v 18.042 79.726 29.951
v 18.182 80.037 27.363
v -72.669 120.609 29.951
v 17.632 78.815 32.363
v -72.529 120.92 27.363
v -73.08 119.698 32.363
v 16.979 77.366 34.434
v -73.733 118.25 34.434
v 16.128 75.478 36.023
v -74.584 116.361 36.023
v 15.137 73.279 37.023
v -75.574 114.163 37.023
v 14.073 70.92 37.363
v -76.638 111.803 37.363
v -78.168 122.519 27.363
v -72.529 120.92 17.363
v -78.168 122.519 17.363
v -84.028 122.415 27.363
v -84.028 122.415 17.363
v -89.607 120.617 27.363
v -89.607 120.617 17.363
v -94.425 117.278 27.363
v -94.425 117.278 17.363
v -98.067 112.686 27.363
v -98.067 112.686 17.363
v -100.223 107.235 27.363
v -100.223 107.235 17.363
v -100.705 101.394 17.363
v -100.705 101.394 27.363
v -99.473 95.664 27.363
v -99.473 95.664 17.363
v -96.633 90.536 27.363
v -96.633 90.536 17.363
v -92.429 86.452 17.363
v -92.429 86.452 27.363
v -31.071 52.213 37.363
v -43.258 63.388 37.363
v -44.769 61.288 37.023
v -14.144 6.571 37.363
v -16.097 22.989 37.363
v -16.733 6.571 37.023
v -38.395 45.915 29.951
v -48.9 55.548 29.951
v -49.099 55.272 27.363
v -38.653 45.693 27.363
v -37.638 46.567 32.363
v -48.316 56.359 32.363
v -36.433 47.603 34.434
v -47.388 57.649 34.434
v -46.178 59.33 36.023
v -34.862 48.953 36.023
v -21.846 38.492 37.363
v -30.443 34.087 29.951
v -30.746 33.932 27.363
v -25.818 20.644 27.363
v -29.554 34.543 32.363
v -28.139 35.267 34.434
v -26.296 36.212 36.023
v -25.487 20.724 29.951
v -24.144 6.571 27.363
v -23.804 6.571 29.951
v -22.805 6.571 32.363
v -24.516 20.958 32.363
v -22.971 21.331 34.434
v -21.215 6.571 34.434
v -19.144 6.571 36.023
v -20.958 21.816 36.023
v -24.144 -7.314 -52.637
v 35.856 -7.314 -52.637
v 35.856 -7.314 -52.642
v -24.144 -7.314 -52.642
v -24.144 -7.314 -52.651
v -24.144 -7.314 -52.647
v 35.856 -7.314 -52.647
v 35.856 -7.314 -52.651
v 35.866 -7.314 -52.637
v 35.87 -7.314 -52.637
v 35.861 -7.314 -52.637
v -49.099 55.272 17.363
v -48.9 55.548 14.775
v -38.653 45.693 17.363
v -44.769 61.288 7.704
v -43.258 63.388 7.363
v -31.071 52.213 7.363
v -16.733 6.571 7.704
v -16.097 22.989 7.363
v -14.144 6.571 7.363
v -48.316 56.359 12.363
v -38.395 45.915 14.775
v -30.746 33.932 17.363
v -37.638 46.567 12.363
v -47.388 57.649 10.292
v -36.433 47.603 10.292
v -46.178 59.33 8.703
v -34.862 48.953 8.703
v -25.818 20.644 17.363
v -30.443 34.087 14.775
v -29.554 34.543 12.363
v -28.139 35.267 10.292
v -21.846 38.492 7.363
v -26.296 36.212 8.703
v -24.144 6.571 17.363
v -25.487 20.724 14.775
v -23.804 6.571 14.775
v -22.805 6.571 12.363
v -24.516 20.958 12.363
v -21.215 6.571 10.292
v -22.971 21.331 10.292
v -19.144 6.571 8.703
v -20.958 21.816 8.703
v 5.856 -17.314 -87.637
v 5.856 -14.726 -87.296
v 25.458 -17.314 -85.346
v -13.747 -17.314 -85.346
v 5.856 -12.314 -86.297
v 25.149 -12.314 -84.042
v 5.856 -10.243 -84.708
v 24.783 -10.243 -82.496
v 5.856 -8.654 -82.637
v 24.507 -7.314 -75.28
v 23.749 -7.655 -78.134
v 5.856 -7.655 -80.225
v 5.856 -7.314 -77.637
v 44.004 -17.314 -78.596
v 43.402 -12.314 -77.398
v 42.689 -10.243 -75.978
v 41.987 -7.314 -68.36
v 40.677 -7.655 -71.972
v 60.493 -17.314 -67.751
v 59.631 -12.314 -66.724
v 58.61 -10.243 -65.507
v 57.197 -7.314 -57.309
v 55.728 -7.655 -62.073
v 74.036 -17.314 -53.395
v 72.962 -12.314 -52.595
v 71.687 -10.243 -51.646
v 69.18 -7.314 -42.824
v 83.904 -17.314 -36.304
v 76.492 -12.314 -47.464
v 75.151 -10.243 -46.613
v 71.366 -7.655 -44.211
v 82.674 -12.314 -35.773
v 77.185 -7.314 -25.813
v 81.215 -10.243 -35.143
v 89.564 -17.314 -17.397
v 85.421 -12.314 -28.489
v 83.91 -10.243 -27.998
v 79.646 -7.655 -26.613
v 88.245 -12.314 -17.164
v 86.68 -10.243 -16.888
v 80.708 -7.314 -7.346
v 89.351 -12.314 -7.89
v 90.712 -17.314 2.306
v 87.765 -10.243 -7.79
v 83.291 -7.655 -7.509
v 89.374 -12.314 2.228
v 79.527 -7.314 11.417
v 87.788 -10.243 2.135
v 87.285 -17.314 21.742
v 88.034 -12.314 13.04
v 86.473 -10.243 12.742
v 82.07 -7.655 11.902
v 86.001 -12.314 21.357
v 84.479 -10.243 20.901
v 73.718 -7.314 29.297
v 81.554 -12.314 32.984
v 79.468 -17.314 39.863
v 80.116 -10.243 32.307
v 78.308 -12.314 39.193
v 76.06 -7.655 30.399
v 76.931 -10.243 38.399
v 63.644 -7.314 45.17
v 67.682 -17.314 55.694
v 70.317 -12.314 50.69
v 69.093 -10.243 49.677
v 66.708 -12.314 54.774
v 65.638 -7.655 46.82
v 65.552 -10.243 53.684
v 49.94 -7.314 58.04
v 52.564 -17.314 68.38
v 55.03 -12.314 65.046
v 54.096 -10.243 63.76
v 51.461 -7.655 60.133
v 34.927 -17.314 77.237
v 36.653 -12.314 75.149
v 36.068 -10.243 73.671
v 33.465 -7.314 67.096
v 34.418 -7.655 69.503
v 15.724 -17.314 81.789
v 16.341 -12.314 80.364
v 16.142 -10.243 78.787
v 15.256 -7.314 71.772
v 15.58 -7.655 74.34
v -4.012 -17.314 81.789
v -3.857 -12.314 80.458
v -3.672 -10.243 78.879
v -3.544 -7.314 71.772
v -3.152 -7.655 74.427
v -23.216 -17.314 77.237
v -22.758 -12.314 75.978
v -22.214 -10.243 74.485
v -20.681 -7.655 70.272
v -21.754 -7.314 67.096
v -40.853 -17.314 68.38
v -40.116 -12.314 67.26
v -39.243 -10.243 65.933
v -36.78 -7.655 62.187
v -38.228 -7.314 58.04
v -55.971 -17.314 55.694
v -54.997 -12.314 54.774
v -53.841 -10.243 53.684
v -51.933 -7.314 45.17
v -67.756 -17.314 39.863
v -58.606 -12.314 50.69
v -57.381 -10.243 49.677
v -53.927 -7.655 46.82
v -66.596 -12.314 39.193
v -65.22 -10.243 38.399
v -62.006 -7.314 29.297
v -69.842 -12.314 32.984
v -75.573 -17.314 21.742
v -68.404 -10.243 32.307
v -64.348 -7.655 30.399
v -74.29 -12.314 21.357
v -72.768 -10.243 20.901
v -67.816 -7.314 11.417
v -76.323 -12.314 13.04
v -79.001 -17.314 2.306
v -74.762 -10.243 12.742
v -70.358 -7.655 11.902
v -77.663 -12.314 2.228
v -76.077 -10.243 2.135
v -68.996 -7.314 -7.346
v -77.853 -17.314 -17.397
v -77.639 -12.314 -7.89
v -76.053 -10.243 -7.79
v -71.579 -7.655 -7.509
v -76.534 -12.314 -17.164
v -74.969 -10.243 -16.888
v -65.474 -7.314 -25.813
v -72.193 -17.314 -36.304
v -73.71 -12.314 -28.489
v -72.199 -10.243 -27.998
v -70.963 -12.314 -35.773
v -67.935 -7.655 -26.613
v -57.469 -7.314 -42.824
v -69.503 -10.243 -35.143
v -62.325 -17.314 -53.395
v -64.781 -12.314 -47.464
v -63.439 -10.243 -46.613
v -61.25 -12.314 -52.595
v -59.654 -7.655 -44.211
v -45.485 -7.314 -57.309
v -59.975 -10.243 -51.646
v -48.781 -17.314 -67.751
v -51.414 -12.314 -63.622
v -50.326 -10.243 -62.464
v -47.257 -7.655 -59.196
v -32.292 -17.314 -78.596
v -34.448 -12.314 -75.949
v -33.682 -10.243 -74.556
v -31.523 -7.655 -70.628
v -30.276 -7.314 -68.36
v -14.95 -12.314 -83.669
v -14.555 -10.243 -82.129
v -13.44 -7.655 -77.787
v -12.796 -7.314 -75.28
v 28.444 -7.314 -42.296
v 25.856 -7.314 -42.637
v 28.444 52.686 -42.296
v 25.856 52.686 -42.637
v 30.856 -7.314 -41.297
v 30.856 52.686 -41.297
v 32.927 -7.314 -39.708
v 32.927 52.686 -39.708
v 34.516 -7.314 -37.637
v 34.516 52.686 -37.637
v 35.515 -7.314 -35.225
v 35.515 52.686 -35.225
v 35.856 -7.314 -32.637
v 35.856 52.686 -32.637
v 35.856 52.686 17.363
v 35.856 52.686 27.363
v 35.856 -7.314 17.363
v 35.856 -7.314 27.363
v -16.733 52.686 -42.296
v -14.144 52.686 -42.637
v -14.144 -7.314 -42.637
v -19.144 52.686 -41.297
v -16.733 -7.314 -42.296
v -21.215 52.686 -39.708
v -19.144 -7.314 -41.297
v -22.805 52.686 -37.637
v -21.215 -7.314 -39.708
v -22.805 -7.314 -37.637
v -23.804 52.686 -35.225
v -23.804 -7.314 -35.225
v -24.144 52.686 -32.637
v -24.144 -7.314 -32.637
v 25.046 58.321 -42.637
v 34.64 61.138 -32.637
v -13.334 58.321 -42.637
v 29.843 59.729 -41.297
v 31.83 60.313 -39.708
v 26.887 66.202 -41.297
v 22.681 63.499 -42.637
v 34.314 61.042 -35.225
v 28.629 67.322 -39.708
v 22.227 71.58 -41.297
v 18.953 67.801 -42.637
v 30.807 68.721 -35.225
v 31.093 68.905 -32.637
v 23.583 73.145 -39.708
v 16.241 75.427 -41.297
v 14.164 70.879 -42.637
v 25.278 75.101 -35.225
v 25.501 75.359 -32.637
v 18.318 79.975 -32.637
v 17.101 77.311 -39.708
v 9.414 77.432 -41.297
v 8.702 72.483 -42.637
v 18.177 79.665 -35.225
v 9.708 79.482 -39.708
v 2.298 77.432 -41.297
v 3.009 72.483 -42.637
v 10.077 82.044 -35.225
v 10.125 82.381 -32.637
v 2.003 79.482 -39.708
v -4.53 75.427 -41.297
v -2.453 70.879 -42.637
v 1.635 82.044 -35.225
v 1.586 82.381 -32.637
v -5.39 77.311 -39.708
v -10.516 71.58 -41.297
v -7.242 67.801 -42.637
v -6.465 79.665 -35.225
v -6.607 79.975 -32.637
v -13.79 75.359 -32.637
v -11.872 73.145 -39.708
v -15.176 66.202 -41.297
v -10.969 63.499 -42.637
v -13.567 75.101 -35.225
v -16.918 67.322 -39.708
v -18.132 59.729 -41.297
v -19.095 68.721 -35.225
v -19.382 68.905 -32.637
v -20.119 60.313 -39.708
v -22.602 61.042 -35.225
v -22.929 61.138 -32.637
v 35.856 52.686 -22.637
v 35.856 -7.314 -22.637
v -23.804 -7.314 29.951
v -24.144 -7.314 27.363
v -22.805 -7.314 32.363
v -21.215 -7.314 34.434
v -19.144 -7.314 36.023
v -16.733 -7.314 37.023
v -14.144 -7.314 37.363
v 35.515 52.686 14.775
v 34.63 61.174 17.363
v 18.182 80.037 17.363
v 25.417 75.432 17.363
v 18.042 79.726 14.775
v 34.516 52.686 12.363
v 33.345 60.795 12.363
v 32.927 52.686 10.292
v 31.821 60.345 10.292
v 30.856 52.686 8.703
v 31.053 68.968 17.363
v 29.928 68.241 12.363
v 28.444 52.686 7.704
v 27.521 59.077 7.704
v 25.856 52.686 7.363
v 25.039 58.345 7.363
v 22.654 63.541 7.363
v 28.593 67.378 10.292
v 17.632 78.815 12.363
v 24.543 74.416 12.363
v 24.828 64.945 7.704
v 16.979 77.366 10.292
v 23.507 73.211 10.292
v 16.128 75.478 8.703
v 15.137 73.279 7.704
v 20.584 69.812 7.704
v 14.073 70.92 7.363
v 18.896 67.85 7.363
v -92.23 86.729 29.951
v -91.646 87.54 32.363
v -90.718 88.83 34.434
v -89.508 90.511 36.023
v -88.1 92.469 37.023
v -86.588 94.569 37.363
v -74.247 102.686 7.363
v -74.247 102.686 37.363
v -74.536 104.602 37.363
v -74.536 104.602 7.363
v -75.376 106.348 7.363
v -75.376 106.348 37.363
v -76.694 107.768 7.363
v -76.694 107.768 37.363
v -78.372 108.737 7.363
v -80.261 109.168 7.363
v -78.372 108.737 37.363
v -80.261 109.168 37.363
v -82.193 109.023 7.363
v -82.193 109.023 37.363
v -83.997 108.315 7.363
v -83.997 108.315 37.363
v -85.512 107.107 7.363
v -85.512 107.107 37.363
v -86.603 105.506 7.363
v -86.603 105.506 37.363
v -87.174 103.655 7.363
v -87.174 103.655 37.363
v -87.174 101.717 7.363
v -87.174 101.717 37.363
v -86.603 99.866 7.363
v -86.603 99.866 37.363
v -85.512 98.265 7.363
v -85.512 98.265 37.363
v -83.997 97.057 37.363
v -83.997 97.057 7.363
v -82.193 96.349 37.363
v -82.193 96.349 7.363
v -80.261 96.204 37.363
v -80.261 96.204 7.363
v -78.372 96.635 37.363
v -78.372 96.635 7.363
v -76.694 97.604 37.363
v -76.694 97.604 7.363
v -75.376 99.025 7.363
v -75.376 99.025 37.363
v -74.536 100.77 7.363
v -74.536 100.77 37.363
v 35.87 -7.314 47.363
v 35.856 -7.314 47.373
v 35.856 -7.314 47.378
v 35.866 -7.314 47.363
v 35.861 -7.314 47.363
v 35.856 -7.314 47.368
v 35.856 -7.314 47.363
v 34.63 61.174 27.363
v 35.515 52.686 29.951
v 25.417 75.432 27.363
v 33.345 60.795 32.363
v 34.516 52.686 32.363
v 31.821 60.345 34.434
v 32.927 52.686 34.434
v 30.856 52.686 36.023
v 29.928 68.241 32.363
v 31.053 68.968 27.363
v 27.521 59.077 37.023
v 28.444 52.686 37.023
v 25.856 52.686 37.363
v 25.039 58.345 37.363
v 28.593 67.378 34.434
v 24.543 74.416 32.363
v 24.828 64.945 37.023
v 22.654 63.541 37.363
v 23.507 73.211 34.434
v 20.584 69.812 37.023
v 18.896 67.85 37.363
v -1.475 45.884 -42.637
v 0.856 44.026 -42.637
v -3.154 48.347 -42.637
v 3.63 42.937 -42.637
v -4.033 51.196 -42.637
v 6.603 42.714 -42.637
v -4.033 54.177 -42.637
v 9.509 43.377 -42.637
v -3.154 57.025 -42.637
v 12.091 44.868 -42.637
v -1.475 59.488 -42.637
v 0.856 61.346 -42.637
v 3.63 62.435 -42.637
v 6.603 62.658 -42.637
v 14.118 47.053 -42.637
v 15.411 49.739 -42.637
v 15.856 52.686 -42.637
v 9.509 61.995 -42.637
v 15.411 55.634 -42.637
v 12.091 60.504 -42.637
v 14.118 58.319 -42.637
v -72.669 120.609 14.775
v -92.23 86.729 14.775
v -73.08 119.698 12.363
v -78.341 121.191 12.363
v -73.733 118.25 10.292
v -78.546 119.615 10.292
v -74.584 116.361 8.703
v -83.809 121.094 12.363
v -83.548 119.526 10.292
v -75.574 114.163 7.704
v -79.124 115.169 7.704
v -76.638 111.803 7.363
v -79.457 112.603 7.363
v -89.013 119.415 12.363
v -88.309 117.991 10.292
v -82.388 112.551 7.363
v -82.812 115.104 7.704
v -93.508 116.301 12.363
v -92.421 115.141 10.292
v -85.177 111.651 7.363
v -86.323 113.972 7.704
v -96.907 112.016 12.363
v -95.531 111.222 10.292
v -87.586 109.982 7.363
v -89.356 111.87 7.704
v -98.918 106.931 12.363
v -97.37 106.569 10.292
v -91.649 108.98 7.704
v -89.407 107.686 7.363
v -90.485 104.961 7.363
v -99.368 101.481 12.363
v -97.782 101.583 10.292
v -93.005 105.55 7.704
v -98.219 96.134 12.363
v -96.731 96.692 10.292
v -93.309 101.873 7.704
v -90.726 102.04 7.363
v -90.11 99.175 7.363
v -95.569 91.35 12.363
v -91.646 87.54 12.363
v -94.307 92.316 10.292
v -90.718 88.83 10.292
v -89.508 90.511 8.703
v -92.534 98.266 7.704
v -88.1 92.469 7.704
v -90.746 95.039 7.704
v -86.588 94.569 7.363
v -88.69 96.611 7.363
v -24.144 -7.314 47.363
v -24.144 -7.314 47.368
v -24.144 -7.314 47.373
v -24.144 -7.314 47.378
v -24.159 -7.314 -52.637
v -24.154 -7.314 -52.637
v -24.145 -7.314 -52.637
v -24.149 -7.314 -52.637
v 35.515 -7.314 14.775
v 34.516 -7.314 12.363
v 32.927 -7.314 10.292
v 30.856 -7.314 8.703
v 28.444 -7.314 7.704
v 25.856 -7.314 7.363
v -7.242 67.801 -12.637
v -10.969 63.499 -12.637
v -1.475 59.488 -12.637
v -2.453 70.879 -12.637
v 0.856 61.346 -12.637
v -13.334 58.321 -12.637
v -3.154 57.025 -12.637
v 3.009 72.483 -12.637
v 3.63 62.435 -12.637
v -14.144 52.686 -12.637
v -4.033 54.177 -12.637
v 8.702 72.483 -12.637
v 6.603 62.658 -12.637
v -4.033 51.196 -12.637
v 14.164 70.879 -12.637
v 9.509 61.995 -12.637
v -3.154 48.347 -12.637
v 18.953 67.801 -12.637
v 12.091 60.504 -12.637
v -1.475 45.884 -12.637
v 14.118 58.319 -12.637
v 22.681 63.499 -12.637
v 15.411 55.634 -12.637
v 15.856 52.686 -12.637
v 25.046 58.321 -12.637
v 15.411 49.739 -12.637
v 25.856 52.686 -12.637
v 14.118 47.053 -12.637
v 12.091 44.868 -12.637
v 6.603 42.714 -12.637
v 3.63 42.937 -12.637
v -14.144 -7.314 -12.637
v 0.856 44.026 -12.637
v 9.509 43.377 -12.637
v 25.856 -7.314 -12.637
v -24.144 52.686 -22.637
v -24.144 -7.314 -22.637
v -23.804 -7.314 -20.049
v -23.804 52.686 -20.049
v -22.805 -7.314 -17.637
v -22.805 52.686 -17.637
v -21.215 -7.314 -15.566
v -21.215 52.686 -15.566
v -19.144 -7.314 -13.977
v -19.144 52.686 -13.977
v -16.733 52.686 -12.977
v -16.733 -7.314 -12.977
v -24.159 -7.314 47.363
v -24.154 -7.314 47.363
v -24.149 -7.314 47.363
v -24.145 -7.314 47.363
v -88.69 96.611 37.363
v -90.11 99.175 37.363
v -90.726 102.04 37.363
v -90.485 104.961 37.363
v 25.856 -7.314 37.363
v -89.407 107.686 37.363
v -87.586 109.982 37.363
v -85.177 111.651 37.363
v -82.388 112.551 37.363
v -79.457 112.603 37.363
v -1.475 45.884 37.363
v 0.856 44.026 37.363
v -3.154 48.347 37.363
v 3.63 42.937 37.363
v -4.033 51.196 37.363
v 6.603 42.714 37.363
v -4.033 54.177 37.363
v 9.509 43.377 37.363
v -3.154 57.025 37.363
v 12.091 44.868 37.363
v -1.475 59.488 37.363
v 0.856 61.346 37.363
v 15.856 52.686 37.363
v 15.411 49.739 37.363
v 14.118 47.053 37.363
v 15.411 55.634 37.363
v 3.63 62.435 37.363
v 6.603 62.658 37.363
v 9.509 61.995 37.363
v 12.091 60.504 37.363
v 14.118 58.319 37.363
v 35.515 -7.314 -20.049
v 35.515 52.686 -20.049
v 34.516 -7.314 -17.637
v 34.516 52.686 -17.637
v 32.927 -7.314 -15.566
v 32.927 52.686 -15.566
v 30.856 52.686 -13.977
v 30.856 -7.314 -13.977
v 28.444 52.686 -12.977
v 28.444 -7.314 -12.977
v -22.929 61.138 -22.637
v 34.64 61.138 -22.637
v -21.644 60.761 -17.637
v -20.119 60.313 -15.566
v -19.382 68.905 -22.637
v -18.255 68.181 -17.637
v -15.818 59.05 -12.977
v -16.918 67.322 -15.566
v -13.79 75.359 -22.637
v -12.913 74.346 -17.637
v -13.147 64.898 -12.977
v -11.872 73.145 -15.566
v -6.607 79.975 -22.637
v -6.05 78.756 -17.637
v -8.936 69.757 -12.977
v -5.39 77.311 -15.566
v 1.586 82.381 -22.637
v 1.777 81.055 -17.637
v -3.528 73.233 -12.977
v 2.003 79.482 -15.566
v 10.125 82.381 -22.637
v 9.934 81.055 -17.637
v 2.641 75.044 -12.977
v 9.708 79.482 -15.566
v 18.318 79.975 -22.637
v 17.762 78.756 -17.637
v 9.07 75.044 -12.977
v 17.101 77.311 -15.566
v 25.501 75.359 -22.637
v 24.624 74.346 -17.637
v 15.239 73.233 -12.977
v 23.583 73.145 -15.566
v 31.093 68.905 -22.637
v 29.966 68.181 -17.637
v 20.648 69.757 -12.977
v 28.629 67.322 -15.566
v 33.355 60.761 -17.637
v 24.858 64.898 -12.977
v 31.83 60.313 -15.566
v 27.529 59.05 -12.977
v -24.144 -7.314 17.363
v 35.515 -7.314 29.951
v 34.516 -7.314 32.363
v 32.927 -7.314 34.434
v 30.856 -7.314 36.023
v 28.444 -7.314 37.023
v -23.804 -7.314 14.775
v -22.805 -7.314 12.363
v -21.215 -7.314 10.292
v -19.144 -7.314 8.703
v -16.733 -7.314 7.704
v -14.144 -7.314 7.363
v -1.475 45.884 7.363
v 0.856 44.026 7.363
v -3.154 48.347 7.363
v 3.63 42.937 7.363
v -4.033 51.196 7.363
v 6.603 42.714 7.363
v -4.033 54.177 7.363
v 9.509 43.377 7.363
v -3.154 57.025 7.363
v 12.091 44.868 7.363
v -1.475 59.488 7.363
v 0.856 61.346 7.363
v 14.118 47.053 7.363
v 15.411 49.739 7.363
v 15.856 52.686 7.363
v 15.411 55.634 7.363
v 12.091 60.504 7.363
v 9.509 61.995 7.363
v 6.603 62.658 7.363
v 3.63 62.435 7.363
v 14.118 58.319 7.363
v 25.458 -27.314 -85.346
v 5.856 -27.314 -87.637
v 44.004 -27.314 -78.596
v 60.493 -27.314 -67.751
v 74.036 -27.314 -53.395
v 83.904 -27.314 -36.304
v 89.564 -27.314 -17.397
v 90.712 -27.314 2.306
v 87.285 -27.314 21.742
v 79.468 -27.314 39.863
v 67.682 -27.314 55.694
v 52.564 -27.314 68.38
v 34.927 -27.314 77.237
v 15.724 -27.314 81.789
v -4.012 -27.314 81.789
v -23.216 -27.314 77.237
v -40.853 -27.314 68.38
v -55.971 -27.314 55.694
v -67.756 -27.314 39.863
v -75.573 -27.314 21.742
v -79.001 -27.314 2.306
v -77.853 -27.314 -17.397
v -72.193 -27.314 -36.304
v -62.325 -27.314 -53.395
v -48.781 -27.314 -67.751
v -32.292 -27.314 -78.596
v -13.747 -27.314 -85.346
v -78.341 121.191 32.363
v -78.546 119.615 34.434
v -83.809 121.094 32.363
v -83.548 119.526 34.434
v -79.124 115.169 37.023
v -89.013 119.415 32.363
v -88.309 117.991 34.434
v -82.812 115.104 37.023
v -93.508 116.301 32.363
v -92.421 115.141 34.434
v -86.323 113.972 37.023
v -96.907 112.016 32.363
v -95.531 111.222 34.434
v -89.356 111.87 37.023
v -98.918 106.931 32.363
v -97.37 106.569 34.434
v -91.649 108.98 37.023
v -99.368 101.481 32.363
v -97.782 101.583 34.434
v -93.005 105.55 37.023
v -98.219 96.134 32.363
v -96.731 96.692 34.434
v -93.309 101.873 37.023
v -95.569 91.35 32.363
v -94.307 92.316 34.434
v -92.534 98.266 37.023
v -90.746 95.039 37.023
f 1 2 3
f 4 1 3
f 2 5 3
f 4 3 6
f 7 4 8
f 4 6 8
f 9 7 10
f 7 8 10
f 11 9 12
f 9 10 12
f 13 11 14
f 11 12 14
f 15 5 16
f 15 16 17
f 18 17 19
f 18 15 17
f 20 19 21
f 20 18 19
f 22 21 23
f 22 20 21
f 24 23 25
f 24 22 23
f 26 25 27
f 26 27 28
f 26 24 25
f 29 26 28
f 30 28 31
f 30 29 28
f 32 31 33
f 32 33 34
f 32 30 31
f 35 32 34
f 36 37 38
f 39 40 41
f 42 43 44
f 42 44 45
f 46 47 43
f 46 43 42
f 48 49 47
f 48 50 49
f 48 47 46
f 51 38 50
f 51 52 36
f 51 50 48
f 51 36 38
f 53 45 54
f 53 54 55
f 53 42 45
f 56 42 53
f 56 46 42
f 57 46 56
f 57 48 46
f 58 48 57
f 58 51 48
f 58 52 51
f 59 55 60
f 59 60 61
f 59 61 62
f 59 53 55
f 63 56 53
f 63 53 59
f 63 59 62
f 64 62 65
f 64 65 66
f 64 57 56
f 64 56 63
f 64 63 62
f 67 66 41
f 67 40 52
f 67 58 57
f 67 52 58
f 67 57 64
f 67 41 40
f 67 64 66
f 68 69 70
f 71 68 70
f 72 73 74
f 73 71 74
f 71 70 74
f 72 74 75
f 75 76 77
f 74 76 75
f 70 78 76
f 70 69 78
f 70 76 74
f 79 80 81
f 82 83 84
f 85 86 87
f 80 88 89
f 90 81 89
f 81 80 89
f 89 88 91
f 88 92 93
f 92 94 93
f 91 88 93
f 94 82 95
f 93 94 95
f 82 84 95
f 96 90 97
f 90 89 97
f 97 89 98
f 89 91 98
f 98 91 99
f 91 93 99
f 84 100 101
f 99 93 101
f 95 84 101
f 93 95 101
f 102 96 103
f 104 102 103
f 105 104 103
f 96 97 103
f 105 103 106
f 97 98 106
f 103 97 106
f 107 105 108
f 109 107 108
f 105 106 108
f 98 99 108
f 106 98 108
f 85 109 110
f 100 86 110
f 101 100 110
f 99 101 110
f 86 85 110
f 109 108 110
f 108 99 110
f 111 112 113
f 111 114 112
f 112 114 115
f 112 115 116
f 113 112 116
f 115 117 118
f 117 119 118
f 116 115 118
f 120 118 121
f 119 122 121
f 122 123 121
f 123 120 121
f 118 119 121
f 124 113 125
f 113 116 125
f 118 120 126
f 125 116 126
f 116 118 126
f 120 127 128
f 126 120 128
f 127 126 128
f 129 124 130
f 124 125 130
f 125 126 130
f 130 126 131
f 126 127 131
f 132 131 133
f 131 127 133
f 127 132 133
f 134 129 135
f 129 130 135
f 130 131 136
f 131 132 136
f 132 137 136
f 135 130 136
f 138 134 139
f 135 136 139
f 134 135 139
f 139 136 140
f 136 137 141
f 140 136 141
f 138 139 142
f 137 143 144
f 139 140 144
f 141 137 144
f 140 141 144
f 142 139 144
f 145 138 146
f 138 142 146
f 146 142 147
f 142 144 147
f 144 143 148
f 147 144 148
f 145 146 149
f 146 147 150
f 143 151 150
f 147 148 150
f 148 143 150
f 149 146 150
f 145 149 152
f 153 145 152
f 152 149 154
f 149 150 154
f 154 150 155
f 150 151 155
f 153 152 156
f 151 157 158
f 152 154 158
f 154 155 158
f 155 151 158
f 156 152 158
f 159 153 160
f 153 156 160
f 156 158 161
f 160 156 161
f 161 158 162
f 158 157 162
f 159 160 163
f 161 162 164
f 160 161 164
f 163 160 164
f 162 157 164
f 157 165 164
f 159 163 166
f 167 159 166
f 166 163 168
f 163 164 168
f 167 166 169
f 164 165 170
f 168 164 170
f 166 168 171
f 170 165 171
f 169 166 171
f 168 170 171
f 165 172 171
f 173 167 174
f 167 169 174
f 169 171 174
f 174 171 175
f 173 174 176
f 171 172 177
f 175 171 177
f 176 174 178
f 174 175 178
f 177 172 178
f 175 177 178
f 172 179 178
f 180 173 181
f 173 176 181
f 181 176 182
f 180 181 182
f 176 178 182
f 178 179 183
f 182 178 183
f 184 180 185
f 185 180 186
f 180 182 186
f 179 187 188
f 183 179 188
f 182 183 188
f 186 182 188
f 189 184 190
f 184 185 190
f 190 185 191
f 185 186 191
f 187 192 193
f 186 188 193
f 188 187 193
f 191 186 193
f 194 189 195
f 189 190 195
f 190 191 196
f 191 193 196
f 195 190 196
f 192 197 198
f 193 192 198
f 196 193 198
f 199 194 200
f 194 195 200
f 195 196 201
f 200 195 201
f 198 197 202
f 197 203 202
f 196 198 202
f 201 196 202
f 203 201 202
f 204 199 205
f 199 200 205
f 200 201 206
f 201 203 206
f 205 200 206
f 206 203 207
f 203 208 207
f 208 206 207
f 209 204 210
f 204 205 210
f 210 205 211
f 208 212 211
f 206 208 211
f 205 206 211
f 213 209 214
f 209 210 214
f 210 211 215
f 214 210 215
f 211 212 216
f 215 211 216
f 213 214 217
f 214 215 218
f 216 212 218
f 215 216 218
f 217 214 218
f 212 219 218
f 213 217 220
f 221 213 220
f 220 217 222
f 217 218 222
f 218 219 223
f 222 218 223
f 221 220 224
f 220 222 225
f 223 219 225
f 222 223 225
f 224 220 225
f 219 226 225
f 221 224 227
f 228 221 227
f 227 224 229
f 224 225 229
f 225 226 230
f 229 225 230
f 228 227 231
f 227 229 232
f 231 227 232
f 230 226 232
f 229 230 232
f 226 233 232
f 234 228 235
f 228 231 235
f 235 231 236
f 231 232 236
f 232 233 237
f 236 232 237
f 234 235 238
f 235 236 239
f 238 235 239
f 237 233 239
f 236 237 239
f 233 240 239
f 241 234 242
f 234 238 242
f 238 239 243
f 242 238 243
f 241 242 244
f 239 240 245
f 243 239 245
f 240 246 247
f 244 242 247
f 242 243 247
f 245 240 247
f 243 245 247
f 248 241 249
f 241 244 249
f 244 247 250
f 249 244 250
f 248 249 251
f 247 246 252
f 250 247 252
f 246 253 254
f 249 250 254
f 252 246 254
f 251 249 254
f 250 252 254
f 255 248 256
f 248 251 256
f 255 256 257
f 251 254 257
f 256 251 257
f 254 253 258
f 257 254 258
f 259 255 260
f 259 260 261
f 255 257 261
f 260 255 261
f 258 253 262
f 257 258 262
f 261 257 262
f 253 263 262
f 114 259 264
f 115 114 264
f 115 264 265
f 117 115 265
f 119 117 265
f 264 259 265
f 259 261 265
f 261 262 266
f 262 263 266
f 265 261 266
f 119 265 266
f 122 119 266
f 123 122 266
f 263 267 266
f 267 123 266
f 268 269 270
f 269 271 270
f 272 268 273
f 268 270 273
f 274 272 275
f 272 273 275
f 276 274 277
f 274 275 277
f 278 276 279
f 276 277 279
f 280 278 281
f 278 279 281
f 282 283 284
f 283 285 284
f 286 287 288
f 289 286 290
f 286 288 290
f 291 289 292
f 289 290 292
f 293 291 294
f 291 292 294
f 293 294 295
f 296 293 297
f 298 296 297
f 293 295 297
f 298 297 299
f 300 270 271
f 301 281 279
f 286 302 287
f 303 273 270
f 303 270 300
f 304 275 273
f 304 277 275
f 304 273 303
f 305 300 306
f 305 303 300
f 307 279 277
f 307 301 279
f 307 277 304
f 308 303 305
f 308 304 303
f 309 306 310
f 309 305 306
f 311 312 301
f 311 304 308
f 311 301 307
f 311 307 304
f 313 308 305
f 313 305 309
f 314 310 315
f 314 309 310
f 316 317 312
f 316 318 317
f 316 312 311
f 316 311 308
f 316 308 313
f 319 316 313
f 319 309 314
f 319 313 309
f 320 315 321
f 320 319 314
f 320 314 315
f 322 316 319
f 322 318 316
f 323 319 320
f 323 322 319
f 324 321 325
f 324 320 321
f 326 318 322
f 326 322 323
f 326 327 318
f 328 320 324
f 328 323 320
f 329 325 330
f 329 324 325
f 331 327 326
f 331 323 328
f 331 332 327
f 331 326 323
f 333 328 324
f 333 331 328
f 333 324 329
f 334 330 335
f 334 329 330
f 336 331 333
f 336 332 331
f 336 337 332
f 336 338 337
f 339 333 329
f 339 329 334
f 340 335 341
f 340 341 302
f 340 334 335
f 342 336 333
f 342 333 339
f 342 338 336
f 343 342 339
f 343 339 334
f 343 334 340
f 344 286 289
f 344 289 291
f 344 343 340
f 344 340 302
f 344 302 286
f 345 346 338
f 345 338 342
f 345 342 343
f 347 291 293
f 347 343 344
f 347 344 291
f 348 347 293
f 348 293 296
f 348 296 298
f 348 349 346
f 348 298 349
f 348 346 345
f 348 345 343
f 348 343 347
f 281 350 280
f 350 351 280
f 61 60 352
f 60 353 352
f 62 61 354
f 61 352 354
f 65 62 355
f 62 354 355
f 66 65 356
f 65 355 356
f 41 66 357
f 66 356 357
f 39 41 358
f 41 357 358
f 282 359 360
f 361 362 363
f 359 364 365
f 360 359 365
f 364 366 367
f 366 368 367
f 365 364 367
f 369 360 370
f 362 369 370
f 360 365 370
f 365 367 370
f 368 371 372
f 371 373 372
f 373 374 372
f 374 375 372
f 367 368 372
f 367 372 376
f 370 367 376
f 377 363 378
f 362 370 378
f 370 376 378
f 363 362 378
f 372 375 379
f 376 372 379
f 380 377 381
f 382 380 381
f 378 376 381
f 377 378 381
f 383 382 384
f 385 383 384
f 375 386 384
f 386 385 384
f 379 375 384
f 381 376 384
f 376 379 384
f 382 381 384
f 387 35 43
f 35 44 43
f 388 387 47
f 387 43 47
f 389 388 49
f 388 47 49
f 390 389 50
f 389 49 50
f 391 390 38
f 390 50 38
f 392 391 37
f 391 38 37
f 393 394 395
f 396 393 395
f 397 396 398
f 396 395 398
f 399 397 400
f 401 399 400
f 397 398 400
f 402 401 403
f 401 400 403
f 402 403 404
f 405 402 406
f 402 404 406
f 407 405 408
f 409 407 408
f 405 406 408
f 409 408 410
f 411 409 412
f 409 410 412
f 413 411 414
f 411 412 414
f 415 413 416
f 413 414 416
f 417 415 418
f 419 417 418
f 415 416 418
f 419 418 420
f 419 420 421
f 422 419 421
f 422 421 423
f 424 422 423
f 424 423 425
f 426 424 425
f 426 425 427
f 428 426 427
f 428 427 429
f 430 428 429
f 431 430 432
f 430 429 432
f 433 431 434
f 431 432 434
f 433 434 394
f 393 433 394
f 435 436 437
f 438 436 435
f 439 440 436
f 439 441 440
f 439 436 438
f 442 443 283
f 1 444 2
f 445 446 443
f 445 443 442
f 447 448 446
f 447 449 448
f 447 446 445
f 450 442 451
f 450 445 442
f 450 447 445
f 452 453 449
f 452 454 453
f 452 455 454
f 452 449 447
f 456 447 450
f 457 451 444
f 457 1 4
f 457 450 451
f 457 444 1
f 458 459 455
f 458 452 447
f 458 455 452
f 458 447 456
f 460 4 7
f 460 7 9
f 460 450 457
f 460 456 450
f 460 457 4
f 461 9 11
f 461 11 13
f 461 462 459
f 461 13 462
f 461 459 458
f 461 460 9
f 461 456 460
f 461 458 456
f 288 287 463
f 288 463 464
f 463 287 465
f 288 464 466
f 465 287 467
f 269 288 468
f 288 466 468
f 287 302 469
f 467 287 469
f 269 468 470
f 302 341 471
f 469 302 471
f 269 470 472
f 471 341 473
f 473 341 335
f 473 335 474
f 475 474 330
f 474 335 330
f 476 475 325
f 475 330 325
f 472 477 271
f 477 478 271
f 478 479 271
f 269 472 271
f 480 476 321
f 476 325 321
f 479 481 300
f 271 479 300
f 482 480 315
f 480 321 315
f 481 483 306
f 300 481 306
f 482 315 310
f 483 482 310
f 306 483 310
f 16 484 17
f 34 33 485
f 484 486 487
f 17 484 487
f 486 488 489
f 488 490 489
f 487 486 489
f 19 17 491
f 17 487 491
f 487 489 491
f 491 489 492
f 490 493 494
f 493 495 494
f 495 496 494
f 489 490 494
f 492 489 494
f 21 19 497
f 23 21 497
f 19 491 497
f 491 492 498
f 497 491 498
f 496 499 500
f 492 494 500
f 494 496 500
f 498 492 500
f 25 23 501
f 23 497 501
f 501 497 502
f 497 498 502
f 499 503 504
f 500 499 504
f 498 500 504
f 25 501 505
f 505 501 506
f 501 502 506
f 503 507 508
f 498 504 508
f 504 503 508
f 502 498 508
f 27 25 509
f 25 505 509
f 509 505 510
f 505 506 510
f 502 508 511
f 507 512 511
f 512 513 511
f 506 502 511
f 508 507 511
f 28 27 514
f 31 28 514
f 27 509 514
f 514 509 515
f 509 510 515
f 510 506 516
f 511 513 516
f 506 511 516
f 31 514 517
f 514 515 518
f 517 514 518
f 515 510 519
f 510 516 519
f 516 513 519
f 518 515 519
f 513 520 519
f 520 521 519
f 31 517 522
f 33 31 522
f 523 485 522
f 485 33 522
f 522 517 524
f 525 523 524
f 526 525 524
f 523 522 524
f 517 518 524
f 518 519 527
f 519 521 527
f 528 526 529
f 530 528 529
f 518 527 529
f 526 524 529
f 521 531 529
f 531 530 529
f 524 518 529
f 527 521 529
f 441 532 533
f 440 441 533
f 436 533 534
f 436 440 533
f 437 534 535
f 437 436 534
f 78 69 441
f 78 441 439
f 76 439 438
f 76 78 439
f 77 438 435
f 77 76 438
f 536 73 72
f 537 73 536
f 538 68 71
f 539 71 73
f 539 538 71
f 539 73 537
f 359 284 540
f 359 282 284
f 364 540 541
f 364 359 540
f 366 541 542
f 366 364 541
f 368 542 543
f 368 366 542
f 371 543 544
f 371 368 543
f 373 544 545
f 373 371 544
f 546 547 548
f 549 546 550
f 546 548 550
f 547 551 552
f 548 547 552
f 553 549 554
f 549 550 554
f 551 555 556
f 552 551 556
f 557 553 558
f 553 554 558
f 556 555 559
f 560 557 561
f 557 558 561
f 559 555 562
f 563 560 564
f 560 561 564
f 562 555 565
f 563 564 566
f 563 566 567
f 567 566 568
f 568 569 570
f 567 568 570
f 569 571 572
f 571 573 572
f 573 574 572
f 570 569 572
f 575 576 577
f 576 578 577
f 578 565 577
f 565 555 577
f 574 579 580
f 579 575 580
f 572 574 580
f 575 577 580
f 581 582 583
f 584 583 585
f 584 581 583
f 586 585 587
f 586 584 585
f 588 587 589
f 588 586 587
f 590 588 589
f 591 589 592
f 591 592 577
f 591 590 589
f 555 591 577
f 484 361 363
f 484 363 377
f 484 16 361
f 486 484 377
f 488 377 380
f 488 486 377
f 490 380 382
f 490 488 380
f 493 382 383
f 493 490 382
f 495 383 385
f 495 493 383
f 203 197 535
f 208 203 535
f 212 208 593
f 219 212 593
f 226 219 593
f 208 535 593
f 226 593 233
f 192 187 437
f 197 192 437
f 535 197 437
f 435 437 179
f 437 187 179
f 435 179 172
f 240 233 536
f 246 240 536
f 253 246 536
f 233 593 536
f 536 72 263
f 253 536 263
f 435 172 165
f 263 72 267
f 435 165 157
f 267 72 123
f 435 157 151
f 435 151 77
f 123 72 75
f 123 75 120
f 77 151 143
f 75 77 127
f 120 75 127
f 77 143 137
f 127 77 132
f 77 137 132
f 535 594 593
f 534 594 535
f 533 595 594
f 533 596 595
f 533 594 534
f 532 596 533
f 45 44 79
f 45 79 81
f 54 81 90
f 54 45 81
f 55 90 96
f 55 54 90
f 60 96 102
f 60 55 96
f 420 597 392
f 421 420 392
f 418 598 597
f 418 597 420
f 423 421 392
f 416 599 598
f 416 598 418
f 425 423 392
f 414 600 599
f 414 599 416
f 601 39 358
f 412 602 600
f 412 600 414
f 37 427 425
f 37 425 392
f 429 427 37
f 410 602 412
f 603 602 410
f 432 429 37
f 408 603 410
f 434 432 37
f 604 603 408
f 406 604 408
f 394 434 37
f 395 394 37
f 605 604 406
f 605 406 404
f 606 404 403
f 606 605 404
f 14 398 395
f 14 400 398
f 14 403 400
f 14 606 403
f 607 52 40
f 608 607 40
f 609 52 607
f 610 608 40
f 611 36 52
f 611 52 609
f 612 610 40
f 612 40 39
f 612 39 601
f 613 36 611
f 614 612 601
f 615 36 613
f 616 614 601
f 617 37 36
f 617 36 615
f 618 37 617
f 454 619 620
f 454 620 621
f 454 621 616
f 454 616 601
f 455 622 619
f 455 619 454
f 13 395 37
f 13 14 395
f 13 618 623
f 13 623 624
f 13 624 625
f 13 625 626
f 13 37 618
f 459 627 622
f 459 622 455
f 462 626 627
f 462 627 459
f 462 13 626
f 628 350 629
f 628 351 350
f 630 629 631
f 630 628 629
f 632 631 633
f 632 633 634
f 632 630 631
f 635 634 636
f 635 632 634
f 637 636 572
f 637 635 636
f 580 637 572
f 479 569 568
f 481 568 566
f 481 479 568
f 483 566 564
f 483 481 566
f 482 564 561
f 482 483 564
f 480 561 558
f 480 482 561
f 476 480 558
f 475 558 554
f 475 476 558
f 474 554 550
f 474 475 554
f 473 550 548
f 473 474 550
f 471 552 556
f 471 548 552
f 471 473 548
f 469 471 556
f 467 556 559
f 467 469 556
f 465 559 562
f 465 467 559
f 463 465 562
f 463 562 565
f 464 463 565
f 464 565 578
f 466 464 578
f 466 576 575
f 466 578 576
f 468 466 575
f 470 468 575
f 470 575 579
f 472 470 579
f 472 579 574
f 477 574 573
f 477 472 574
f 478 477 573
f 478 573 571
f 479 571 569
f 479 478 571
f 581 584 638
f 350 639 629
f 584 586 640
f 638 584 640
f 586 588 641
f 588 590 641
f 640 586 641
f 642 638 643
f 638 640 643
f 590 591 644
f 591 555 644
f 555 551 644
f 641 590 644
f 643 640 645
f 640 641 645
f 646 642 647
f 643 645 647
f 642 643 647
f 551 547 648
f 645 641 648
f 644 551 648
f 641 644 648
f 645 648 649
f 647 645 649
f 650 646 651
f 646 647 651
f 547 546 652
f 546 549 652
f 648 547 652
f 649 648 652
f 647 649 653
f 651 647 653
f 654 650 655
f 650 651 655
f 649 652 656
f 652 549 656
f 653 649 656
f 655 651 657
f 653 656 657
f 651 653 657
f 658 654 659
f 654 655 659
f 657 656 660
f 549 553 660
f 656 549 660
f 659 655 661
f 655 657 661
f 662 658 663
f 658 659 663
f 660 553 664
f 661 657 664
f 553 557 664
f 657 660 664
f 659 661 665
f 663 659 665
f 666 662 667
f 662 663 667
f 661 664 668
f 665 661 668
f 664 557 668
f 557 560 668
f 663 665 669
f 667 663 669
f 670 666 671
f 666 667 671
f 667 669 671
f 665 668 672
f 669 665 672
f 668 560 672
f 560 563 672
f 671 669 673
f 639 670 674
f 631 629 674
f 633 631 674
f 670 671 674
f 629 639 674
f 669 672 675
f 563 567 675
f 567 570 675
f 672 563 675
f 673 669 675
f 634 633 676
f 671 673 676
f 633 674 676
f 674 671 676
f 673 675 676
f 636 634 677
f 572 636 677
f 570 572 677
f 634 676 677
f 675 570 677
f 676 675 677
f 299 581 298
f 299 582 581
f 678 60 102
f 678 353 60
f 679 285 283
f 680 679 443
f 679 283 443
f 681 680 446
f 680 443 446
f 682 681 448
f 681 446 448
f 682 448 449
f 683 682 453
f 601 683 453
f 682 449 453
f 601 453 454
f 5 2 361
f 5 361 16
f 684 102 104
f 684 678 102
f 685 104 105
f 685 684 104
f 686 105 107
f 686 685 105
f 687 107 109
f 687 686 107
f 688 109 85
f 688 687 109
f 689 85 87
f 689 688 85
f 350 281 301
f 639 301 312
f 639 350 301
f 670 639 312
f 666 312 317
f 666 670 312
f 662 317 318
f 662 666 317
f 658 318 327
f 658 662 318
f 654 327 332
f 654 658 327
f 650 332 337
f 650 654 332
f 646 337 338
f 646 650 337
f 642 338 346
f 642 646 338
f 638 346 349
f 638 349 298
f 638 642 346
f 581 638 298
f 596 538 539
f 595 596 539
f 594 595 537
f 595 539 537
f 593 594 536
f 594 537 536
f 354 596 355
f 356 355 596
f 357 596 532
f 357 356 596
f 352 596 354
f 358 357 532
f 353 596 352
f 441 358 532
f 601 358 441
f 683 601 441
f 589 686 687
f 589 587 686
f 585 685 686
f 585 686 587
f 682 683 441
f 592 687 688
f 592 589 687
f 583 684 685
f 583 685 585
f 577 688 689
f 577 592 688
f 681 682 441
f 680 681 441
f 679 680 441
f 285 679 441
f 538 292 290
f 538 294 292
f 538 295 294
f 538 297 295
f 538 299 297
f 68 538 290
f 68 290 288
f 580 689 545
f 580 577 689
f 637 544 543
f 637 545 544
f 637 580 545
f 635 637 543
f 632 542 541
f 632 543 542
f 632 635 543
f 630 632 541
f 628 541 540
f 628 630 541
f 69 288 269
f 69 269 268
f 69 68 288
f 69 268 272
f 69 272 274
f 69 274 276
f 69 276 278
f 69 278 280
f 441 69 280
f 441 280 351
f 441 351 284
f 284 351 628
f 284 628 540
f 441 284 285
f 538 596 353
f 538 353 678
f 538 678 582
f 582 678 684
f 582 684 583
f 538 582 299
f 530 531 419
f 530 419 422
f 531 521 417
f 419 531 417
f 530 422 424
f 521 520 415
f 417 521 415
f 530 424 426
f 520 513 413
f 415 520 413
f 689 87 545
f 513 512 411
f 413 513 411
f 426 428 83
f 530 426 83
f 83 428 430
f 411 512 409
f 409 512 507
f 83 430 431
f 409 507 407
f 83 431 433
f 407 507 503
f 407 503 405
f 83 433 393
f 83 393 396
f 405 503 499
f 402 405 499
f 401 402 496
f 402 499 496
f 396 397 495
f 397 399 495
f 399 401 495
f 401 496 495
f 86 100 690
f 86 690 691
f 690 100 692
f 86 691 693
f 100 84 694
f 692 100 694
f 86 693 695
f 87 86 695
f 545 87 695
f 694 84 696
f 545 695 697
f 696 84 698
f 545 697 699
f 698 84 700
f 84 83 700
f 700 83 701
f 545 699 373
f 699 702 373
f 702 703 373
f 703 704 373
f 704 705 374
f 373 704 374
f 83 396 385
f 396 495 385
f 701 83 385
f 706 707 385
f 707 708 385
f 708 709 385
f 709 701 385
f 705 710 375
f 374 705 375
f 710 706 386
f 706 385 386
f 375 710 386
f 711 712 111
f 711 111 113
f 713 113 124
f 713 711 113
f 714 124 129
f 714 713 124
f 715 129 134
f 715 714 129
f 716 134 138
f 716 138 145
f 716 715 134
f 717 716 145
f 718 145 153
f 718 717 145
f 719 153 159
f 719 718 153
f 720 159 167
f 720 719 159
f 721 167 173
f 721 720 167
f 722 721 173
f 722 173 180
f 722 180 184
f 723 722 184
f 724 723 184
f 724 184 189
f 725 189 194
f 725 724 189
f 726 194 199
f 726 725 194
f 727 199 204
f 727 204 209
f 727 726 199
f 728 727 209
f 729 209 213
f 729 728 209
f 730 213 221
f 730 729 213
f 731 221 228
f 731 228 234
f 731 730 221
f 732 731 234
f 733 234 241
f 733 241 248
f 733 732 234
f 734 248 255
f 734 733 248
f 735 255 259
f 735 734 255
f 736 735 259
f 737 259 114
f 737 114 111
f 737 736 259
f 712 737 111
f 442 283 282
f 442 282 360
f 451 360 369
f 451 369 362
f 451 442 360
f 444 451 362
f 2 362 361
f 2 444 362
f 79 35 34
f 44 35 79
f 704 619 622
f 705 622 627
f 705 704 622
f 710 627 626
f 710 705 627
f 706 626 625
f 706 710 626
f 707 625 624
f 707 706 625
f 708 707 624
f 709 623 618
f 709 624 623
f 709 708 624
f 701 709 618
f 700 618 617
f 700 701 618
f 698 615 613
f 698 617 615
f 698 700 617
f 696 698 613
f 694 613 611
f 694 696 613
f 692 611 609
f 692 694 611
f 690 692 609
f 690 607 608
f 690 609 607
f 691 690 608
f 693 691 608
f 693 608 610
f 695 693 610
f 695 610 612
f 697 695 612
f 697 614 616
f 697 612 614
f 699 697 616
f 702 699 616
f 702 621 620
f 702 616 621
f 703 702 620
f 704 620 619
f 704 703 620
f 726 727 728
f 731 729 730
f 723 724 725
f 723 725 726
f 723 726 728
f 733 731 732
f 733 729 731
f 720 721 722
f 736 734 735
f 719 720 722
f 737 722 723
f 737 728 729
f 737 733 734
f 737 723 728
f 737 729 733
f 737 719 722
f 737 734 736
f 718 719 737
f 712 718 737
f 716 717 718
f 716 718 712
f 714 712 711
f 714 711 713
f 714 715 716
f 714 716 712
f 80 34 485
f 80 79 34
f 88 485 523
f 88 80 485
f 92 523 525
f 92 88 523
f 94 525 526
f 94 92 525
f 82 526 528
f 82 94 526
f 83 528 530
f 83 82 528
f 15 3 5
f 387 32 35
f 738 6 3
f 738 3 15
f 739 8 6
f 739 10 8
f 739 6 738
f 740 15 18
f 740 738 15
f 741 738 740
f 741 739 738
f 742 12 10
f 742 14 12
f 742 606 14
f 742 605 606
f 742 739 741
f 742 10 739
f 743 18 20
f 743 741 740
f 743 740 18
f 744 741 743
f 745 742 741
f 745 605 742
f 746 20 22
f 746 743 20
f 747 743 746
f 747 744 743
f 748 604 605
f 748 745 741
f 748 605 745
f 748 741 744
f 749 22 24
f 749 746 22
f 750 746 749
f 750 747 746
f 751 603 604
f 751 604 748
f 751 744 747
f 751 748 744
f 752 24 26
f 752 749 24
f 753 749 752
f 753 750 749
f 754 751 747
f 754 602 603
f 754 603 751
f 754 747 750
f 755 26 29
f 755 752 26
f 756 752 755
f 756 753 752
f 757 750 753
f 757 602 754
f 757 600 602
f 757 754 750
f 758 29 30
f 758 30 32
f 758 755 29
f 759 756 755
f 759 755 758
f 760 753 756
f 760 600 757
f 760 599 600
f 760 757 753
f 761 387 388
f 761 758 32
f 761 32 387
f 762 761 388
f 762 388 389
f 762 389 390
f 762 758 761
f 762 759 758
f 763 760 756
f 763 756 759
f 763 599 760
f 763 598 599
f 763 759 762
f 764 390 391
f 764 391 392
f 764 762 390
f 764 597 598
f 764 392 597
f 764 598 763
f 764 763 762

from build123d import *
from build123d.topology import SkipClean

# Parameters (mm, degrees)
SKETCH1_W           = 40
SKETCH1_H           = 60
BOSS_EXTRUDE1_DEPTH = 10
SKETCH2_W           = 30
SKETCH2_H           = 40
BOSS_EXTRUDE2_DEPTH = 40
SKETCH6_R           = 15
SKETCH6_R_2         = 5
BOSS_EXTRUDE4_DEPTH = 20
SKETCH7_R           = 5
CUT_EXTRUDE2_DEPTH  = 30
CUT_EXTRUDE3_START  = 10
SKETCH8_W           = 30
SKETCH8_H           = 10
CUT_EXTRUDE3_DEPTH  = 50
BOSS_EXTRUDE5_START = 20
SKETCH10_R          = 3.25
BOSS_EXTRUDE5_DEPTH = 15
FILLET1_R           = 30
FILLET2_R           = 5
FILLET3_R           = 5
FILLET4_R           = 5
FILLET5_R           = 5
SCALE_1_SCALE       = 2
SKETCH_1_R          = 85
EXTRUDE_1_DEPTH     = 20
FILLET_1_R          = 10


# Some blends are built 0.0001 mm under size
with BuildPart() as part:
    # Sketch1 → Boss-Extrude1 (new body)
    with BuildSketch(Plane(origin=(0, 0, 0), x_dir=(1, 0, 0), z_dir=(0, 1, 0))):
        Rectangle(SKETCH1_W, SKETCH1_H)
    extrude(amount=BOSS_EXTRUDE1_DEPTH)

    # Sketch2 → Boss-Extrude2 (add)
    with BuildSketch(Plane(origin=(0, 0, 0), x_dir=(1, 0, 0), z_dir=(0, 1, 0))):
        Rectangle(SKETCH2_W, SKETCH2_H)
    extrude(amount=BOSS_EXTRUDE2_DEPTH)

    # Sketch6 → Boss-Extrude4 (add, symmetric)
    with BuildSketch(Plane.XY):
        with Locations((0, 40)):
            Circle(SKETCH6_R)
        with Locations((0, 40)):
            Circle(SKETCH6_R_2, mode=Mode.SUBTRACT)
    extrude(amount=BOSS_EXTRUDE4_DEPTH, both=True)

    # Sketch7 → Cut-Extrude2 (cut, symmetric)
    with SkipClean():  # the faces are left unmerged after this step: merging them gives an invalid solid
        with BuildSketch(Plane.XY):
            with Locations((0, 40)):
                Circle(SKETCH7_R)
        extrude(amount=CUT_EXTRUDE2_DEPTH, both=True, mode=Mode.SUBTRACT)

    # Sketch8 → Cut-Extrude3 (cut)
    with BuildSketch(Plane(origin=(0, 0, 0), x_dir=(1, 0, 0), z_dir=(0, 1, 0)).offset(CUT_EXTRUDE3_START)):
        Rectangle(SKETCH8_W, SKETCH8_H)
    extrude(amount=CUT_EXTRUDE3_DEPTH, mode=Mode.SUBTRACT)

    # Sketch10 → Boss-Extrude5 (add)
    with BuildSketch(Plane.XY.offset(BOSS_EXTRUDE5_START)):
        with BuildLine():
            Line((-49.142232779, 56.88315603), (-8.761443884, 27.824734045))
            ThreePointArc((-8.761443884, 27.824734045), (-12.990381057, 47.5), (6.163367673, 53.675265955))
            Line((6.163367673, 53.675265955), (-39.192358407, 74.11684397))
            ThreePointArc((-39.192358407, 74.11684397), (-51.961524227, 70), (-49.142232779, 56.88315603))
        make_face()
        with Locations((-43.301270189, 65)):
            Circle(SKETCH10_R, mode=Mode.SUBTRACT)
    extrude(amount=-BOSS_EXTRUDE5_DEPTH)

    # Fillet1
    fillet1_edges = [part.edges().sort_by_distance(p)[0] for p in [
        (-15, 32.314061796, 12.5),
    ]]
    fillet(fillet1_edges, radius=FILLET1_R)

    # Fillet2
    fillet2_edges = [part.edges().sort_by_distance(p)[0] for p in [
        (-38.309672505, 49.087936664, 20),
        (-38.309672505, 49.087936664, 5),
        (-18.300874237, 30.622707436, 5),
        (-18.300874237, 30.622707436, 20),
        (15, 25, 20),
        (12.598621256, 48.140930073, 20),
        (15, 25, 5),
        (12.598621256, 48.140930073, 5),
        (-51.961524227, 70, 20),
        (-16.514495367, 63.896054962, 5),
        (-51.961524227, 70, 5),
        (-16.514495367, 63.896054962, 20),
        (-15, 13.471092695, 20),
        (-15, 13.471092695, 5),
    ]]
    fillet(fillet2_edges, radius=FILLET2_R)

    # Fillet3
    fillet3_edges = [part.edges().sort_by_distance(p)[0] for p in [
        (15, 25, -20),
        (-15, 25, -20),
        (0, 55, -20),
        (-15, 25, -5),
        (0, 55, -5),
        (15, 25, -5),
    ]]
    fillet(fillet3_edges, radius=FILLET3_R)

    # Fillet4
    fillet4_edges = [part.edges().sort_by_distance(p)[0] for p in [
        (-20, 10, 0),
        (0, 10, 30),
        (20, 10, 0),
        (0, 10, -30),
    ]]
    fillet(fillet4_edges, radius=FILLET4_R - 0.0001)  # a hair under: the kernel refuses the full size

    # Fillet5
    # the kernel refuses this fillet: 5 mm, written as the material it takes off along each edge
    with BuildSketch(Plane(origin=(15, 10, 25), x_dir=(0, 0, 1), z_dir=(-1, 0, 0))) as fillet5_piece_1:
        with BuildLine():
            CenterArc((0.0001, -4.9999), 4.9999, 0, 90)
            Line((5, -4.9999), (5, 0))
            Line((5, 0), (0.0001, 0))
        make_face()
    revolve(axis=Axis((15, 10, 25), (0, 1, 0)), revolution_arc=90, mode=Mode.SUBTRACT)
    with BuildSketch(Plane(origin=(-15, 10, 25), x_dir=(-1, 0, 0), z_dir=(0, 0, -1))) as fillet5_piece_2:
        with BuildLine():
            CenterArc((0.0001, -4.9999), 4.9999, 0, 90)
            Line((5, -4.9999), (5, 0))
            Line((5, 0), (0.0001, 0))
        make_face()
    revolve(axis=Axis((-15, 10, 25), (0, 1, 0)), revolution_arc=90, mode=Mode.SUBTRACT)
    with BuildSketch(Plane(origin=(15, 10, -25), x_dir=(1, 0, 0), z_dir=(0, 0, 1))) as fillet5_piece_3:
        with BuildLine():
            CenterArc((0.0001, -4.9999), 4.9999, 0, 90)
            Line((5, -4.9999), (5, 0))
            Line((5, 0), (0.0001, 0))
        make_face()
    revolve(axis=Axis((15, 10, -25), (0, 1, 0)), revolution_arc=90, mode=Mode.SUBTRACT)
    with BuildSketch(Plane(origin=(-15, 10, -25), x_dir=(0, 0, -1), z_dir=(1, 0, 0))) as fillet5_piece_4:
        with BuildLine():
            CenterArc((0.0001, -4.9999), 4.9999, 0, 90)
            Line((5, -4.9999), (5, 0))
            Line((5, 0), (0.0001, 0))
        make_face()
    revolve(axis=Axis((-15, 10, -25), (0, 1, 0)), revolution_arc=90, mode=Mode.SUBTRACT)
    with BuildSketch(Plane(origin=(-20, -12.5, -30), x_dir=(0, 0, 1), z_dir=(0, 1, 0)), Plane(origin=(20, -12.5, -30), x_dir=(-1, 0, 0), z_dir=(0, 1, 0))) as fillet5_piece_5:
        with BuildLine():
            CenterArc((FILLET5_R, FILLET5_R), FILLET5_R, 180, 90)
            Line((0, FILLET5_R), (0, 0))
            Line((0, 0), (FILLET5_R, 0))
        make_face()
    extrude(amount=22.5, mode=Mode.SUBTRACT)
    with BuildSketch(Plane(origin=(20, -12.5, 30), x_dir=(-1, 0, 0), z_dir=(0, 1, 0)), Plane(origin=(-20, -12.5, 30), x_dir=(0, 0, -1), z_dir=(0, 1, 0))) as fillet5_piece_6:
        with BuildLine():
            CenterArc((FILLET5_R, -FILLET5_R), FILLET5_R, 90, 90)
            Line((0, -FILLET5_R), (0, 0))
            Line((0, 0), (FILLET5_R, 0))
        make_face()
    extrude(amount=22.5, mode=Mode.SUBTRACT)


with BuildPart() as part_1:
    # 缩放比例1: scaled about (-5.855669763, 27.313859585, 2.636754643)
    add(part.part.scale(SCALE_1_SCALE).moved(Location((5.855669763, -27.313859585, -2.636754643))))

    # 草图1 → 凸台-拉伸1 (add)
    with BuildSketch(Plane.XZ.offset(27.313870031)):
        with Locations(Location((5.855672976, -2.63675609, 0), (0, 0, 270))):
            Circle(SKETCH_1_R)
    extrude(amount=-EXTRUDE_1_DEPTH)

    # 圆角1
    fillet_1_edges = [part_1.edges().sort_by_distance(p)[0] for p in [
        (5.855672976, -7.313870031, 82.36324391),
    ]]
    fillet(fillet_1_edges, radius=FILLET_1_R)


solid = part_1.part
